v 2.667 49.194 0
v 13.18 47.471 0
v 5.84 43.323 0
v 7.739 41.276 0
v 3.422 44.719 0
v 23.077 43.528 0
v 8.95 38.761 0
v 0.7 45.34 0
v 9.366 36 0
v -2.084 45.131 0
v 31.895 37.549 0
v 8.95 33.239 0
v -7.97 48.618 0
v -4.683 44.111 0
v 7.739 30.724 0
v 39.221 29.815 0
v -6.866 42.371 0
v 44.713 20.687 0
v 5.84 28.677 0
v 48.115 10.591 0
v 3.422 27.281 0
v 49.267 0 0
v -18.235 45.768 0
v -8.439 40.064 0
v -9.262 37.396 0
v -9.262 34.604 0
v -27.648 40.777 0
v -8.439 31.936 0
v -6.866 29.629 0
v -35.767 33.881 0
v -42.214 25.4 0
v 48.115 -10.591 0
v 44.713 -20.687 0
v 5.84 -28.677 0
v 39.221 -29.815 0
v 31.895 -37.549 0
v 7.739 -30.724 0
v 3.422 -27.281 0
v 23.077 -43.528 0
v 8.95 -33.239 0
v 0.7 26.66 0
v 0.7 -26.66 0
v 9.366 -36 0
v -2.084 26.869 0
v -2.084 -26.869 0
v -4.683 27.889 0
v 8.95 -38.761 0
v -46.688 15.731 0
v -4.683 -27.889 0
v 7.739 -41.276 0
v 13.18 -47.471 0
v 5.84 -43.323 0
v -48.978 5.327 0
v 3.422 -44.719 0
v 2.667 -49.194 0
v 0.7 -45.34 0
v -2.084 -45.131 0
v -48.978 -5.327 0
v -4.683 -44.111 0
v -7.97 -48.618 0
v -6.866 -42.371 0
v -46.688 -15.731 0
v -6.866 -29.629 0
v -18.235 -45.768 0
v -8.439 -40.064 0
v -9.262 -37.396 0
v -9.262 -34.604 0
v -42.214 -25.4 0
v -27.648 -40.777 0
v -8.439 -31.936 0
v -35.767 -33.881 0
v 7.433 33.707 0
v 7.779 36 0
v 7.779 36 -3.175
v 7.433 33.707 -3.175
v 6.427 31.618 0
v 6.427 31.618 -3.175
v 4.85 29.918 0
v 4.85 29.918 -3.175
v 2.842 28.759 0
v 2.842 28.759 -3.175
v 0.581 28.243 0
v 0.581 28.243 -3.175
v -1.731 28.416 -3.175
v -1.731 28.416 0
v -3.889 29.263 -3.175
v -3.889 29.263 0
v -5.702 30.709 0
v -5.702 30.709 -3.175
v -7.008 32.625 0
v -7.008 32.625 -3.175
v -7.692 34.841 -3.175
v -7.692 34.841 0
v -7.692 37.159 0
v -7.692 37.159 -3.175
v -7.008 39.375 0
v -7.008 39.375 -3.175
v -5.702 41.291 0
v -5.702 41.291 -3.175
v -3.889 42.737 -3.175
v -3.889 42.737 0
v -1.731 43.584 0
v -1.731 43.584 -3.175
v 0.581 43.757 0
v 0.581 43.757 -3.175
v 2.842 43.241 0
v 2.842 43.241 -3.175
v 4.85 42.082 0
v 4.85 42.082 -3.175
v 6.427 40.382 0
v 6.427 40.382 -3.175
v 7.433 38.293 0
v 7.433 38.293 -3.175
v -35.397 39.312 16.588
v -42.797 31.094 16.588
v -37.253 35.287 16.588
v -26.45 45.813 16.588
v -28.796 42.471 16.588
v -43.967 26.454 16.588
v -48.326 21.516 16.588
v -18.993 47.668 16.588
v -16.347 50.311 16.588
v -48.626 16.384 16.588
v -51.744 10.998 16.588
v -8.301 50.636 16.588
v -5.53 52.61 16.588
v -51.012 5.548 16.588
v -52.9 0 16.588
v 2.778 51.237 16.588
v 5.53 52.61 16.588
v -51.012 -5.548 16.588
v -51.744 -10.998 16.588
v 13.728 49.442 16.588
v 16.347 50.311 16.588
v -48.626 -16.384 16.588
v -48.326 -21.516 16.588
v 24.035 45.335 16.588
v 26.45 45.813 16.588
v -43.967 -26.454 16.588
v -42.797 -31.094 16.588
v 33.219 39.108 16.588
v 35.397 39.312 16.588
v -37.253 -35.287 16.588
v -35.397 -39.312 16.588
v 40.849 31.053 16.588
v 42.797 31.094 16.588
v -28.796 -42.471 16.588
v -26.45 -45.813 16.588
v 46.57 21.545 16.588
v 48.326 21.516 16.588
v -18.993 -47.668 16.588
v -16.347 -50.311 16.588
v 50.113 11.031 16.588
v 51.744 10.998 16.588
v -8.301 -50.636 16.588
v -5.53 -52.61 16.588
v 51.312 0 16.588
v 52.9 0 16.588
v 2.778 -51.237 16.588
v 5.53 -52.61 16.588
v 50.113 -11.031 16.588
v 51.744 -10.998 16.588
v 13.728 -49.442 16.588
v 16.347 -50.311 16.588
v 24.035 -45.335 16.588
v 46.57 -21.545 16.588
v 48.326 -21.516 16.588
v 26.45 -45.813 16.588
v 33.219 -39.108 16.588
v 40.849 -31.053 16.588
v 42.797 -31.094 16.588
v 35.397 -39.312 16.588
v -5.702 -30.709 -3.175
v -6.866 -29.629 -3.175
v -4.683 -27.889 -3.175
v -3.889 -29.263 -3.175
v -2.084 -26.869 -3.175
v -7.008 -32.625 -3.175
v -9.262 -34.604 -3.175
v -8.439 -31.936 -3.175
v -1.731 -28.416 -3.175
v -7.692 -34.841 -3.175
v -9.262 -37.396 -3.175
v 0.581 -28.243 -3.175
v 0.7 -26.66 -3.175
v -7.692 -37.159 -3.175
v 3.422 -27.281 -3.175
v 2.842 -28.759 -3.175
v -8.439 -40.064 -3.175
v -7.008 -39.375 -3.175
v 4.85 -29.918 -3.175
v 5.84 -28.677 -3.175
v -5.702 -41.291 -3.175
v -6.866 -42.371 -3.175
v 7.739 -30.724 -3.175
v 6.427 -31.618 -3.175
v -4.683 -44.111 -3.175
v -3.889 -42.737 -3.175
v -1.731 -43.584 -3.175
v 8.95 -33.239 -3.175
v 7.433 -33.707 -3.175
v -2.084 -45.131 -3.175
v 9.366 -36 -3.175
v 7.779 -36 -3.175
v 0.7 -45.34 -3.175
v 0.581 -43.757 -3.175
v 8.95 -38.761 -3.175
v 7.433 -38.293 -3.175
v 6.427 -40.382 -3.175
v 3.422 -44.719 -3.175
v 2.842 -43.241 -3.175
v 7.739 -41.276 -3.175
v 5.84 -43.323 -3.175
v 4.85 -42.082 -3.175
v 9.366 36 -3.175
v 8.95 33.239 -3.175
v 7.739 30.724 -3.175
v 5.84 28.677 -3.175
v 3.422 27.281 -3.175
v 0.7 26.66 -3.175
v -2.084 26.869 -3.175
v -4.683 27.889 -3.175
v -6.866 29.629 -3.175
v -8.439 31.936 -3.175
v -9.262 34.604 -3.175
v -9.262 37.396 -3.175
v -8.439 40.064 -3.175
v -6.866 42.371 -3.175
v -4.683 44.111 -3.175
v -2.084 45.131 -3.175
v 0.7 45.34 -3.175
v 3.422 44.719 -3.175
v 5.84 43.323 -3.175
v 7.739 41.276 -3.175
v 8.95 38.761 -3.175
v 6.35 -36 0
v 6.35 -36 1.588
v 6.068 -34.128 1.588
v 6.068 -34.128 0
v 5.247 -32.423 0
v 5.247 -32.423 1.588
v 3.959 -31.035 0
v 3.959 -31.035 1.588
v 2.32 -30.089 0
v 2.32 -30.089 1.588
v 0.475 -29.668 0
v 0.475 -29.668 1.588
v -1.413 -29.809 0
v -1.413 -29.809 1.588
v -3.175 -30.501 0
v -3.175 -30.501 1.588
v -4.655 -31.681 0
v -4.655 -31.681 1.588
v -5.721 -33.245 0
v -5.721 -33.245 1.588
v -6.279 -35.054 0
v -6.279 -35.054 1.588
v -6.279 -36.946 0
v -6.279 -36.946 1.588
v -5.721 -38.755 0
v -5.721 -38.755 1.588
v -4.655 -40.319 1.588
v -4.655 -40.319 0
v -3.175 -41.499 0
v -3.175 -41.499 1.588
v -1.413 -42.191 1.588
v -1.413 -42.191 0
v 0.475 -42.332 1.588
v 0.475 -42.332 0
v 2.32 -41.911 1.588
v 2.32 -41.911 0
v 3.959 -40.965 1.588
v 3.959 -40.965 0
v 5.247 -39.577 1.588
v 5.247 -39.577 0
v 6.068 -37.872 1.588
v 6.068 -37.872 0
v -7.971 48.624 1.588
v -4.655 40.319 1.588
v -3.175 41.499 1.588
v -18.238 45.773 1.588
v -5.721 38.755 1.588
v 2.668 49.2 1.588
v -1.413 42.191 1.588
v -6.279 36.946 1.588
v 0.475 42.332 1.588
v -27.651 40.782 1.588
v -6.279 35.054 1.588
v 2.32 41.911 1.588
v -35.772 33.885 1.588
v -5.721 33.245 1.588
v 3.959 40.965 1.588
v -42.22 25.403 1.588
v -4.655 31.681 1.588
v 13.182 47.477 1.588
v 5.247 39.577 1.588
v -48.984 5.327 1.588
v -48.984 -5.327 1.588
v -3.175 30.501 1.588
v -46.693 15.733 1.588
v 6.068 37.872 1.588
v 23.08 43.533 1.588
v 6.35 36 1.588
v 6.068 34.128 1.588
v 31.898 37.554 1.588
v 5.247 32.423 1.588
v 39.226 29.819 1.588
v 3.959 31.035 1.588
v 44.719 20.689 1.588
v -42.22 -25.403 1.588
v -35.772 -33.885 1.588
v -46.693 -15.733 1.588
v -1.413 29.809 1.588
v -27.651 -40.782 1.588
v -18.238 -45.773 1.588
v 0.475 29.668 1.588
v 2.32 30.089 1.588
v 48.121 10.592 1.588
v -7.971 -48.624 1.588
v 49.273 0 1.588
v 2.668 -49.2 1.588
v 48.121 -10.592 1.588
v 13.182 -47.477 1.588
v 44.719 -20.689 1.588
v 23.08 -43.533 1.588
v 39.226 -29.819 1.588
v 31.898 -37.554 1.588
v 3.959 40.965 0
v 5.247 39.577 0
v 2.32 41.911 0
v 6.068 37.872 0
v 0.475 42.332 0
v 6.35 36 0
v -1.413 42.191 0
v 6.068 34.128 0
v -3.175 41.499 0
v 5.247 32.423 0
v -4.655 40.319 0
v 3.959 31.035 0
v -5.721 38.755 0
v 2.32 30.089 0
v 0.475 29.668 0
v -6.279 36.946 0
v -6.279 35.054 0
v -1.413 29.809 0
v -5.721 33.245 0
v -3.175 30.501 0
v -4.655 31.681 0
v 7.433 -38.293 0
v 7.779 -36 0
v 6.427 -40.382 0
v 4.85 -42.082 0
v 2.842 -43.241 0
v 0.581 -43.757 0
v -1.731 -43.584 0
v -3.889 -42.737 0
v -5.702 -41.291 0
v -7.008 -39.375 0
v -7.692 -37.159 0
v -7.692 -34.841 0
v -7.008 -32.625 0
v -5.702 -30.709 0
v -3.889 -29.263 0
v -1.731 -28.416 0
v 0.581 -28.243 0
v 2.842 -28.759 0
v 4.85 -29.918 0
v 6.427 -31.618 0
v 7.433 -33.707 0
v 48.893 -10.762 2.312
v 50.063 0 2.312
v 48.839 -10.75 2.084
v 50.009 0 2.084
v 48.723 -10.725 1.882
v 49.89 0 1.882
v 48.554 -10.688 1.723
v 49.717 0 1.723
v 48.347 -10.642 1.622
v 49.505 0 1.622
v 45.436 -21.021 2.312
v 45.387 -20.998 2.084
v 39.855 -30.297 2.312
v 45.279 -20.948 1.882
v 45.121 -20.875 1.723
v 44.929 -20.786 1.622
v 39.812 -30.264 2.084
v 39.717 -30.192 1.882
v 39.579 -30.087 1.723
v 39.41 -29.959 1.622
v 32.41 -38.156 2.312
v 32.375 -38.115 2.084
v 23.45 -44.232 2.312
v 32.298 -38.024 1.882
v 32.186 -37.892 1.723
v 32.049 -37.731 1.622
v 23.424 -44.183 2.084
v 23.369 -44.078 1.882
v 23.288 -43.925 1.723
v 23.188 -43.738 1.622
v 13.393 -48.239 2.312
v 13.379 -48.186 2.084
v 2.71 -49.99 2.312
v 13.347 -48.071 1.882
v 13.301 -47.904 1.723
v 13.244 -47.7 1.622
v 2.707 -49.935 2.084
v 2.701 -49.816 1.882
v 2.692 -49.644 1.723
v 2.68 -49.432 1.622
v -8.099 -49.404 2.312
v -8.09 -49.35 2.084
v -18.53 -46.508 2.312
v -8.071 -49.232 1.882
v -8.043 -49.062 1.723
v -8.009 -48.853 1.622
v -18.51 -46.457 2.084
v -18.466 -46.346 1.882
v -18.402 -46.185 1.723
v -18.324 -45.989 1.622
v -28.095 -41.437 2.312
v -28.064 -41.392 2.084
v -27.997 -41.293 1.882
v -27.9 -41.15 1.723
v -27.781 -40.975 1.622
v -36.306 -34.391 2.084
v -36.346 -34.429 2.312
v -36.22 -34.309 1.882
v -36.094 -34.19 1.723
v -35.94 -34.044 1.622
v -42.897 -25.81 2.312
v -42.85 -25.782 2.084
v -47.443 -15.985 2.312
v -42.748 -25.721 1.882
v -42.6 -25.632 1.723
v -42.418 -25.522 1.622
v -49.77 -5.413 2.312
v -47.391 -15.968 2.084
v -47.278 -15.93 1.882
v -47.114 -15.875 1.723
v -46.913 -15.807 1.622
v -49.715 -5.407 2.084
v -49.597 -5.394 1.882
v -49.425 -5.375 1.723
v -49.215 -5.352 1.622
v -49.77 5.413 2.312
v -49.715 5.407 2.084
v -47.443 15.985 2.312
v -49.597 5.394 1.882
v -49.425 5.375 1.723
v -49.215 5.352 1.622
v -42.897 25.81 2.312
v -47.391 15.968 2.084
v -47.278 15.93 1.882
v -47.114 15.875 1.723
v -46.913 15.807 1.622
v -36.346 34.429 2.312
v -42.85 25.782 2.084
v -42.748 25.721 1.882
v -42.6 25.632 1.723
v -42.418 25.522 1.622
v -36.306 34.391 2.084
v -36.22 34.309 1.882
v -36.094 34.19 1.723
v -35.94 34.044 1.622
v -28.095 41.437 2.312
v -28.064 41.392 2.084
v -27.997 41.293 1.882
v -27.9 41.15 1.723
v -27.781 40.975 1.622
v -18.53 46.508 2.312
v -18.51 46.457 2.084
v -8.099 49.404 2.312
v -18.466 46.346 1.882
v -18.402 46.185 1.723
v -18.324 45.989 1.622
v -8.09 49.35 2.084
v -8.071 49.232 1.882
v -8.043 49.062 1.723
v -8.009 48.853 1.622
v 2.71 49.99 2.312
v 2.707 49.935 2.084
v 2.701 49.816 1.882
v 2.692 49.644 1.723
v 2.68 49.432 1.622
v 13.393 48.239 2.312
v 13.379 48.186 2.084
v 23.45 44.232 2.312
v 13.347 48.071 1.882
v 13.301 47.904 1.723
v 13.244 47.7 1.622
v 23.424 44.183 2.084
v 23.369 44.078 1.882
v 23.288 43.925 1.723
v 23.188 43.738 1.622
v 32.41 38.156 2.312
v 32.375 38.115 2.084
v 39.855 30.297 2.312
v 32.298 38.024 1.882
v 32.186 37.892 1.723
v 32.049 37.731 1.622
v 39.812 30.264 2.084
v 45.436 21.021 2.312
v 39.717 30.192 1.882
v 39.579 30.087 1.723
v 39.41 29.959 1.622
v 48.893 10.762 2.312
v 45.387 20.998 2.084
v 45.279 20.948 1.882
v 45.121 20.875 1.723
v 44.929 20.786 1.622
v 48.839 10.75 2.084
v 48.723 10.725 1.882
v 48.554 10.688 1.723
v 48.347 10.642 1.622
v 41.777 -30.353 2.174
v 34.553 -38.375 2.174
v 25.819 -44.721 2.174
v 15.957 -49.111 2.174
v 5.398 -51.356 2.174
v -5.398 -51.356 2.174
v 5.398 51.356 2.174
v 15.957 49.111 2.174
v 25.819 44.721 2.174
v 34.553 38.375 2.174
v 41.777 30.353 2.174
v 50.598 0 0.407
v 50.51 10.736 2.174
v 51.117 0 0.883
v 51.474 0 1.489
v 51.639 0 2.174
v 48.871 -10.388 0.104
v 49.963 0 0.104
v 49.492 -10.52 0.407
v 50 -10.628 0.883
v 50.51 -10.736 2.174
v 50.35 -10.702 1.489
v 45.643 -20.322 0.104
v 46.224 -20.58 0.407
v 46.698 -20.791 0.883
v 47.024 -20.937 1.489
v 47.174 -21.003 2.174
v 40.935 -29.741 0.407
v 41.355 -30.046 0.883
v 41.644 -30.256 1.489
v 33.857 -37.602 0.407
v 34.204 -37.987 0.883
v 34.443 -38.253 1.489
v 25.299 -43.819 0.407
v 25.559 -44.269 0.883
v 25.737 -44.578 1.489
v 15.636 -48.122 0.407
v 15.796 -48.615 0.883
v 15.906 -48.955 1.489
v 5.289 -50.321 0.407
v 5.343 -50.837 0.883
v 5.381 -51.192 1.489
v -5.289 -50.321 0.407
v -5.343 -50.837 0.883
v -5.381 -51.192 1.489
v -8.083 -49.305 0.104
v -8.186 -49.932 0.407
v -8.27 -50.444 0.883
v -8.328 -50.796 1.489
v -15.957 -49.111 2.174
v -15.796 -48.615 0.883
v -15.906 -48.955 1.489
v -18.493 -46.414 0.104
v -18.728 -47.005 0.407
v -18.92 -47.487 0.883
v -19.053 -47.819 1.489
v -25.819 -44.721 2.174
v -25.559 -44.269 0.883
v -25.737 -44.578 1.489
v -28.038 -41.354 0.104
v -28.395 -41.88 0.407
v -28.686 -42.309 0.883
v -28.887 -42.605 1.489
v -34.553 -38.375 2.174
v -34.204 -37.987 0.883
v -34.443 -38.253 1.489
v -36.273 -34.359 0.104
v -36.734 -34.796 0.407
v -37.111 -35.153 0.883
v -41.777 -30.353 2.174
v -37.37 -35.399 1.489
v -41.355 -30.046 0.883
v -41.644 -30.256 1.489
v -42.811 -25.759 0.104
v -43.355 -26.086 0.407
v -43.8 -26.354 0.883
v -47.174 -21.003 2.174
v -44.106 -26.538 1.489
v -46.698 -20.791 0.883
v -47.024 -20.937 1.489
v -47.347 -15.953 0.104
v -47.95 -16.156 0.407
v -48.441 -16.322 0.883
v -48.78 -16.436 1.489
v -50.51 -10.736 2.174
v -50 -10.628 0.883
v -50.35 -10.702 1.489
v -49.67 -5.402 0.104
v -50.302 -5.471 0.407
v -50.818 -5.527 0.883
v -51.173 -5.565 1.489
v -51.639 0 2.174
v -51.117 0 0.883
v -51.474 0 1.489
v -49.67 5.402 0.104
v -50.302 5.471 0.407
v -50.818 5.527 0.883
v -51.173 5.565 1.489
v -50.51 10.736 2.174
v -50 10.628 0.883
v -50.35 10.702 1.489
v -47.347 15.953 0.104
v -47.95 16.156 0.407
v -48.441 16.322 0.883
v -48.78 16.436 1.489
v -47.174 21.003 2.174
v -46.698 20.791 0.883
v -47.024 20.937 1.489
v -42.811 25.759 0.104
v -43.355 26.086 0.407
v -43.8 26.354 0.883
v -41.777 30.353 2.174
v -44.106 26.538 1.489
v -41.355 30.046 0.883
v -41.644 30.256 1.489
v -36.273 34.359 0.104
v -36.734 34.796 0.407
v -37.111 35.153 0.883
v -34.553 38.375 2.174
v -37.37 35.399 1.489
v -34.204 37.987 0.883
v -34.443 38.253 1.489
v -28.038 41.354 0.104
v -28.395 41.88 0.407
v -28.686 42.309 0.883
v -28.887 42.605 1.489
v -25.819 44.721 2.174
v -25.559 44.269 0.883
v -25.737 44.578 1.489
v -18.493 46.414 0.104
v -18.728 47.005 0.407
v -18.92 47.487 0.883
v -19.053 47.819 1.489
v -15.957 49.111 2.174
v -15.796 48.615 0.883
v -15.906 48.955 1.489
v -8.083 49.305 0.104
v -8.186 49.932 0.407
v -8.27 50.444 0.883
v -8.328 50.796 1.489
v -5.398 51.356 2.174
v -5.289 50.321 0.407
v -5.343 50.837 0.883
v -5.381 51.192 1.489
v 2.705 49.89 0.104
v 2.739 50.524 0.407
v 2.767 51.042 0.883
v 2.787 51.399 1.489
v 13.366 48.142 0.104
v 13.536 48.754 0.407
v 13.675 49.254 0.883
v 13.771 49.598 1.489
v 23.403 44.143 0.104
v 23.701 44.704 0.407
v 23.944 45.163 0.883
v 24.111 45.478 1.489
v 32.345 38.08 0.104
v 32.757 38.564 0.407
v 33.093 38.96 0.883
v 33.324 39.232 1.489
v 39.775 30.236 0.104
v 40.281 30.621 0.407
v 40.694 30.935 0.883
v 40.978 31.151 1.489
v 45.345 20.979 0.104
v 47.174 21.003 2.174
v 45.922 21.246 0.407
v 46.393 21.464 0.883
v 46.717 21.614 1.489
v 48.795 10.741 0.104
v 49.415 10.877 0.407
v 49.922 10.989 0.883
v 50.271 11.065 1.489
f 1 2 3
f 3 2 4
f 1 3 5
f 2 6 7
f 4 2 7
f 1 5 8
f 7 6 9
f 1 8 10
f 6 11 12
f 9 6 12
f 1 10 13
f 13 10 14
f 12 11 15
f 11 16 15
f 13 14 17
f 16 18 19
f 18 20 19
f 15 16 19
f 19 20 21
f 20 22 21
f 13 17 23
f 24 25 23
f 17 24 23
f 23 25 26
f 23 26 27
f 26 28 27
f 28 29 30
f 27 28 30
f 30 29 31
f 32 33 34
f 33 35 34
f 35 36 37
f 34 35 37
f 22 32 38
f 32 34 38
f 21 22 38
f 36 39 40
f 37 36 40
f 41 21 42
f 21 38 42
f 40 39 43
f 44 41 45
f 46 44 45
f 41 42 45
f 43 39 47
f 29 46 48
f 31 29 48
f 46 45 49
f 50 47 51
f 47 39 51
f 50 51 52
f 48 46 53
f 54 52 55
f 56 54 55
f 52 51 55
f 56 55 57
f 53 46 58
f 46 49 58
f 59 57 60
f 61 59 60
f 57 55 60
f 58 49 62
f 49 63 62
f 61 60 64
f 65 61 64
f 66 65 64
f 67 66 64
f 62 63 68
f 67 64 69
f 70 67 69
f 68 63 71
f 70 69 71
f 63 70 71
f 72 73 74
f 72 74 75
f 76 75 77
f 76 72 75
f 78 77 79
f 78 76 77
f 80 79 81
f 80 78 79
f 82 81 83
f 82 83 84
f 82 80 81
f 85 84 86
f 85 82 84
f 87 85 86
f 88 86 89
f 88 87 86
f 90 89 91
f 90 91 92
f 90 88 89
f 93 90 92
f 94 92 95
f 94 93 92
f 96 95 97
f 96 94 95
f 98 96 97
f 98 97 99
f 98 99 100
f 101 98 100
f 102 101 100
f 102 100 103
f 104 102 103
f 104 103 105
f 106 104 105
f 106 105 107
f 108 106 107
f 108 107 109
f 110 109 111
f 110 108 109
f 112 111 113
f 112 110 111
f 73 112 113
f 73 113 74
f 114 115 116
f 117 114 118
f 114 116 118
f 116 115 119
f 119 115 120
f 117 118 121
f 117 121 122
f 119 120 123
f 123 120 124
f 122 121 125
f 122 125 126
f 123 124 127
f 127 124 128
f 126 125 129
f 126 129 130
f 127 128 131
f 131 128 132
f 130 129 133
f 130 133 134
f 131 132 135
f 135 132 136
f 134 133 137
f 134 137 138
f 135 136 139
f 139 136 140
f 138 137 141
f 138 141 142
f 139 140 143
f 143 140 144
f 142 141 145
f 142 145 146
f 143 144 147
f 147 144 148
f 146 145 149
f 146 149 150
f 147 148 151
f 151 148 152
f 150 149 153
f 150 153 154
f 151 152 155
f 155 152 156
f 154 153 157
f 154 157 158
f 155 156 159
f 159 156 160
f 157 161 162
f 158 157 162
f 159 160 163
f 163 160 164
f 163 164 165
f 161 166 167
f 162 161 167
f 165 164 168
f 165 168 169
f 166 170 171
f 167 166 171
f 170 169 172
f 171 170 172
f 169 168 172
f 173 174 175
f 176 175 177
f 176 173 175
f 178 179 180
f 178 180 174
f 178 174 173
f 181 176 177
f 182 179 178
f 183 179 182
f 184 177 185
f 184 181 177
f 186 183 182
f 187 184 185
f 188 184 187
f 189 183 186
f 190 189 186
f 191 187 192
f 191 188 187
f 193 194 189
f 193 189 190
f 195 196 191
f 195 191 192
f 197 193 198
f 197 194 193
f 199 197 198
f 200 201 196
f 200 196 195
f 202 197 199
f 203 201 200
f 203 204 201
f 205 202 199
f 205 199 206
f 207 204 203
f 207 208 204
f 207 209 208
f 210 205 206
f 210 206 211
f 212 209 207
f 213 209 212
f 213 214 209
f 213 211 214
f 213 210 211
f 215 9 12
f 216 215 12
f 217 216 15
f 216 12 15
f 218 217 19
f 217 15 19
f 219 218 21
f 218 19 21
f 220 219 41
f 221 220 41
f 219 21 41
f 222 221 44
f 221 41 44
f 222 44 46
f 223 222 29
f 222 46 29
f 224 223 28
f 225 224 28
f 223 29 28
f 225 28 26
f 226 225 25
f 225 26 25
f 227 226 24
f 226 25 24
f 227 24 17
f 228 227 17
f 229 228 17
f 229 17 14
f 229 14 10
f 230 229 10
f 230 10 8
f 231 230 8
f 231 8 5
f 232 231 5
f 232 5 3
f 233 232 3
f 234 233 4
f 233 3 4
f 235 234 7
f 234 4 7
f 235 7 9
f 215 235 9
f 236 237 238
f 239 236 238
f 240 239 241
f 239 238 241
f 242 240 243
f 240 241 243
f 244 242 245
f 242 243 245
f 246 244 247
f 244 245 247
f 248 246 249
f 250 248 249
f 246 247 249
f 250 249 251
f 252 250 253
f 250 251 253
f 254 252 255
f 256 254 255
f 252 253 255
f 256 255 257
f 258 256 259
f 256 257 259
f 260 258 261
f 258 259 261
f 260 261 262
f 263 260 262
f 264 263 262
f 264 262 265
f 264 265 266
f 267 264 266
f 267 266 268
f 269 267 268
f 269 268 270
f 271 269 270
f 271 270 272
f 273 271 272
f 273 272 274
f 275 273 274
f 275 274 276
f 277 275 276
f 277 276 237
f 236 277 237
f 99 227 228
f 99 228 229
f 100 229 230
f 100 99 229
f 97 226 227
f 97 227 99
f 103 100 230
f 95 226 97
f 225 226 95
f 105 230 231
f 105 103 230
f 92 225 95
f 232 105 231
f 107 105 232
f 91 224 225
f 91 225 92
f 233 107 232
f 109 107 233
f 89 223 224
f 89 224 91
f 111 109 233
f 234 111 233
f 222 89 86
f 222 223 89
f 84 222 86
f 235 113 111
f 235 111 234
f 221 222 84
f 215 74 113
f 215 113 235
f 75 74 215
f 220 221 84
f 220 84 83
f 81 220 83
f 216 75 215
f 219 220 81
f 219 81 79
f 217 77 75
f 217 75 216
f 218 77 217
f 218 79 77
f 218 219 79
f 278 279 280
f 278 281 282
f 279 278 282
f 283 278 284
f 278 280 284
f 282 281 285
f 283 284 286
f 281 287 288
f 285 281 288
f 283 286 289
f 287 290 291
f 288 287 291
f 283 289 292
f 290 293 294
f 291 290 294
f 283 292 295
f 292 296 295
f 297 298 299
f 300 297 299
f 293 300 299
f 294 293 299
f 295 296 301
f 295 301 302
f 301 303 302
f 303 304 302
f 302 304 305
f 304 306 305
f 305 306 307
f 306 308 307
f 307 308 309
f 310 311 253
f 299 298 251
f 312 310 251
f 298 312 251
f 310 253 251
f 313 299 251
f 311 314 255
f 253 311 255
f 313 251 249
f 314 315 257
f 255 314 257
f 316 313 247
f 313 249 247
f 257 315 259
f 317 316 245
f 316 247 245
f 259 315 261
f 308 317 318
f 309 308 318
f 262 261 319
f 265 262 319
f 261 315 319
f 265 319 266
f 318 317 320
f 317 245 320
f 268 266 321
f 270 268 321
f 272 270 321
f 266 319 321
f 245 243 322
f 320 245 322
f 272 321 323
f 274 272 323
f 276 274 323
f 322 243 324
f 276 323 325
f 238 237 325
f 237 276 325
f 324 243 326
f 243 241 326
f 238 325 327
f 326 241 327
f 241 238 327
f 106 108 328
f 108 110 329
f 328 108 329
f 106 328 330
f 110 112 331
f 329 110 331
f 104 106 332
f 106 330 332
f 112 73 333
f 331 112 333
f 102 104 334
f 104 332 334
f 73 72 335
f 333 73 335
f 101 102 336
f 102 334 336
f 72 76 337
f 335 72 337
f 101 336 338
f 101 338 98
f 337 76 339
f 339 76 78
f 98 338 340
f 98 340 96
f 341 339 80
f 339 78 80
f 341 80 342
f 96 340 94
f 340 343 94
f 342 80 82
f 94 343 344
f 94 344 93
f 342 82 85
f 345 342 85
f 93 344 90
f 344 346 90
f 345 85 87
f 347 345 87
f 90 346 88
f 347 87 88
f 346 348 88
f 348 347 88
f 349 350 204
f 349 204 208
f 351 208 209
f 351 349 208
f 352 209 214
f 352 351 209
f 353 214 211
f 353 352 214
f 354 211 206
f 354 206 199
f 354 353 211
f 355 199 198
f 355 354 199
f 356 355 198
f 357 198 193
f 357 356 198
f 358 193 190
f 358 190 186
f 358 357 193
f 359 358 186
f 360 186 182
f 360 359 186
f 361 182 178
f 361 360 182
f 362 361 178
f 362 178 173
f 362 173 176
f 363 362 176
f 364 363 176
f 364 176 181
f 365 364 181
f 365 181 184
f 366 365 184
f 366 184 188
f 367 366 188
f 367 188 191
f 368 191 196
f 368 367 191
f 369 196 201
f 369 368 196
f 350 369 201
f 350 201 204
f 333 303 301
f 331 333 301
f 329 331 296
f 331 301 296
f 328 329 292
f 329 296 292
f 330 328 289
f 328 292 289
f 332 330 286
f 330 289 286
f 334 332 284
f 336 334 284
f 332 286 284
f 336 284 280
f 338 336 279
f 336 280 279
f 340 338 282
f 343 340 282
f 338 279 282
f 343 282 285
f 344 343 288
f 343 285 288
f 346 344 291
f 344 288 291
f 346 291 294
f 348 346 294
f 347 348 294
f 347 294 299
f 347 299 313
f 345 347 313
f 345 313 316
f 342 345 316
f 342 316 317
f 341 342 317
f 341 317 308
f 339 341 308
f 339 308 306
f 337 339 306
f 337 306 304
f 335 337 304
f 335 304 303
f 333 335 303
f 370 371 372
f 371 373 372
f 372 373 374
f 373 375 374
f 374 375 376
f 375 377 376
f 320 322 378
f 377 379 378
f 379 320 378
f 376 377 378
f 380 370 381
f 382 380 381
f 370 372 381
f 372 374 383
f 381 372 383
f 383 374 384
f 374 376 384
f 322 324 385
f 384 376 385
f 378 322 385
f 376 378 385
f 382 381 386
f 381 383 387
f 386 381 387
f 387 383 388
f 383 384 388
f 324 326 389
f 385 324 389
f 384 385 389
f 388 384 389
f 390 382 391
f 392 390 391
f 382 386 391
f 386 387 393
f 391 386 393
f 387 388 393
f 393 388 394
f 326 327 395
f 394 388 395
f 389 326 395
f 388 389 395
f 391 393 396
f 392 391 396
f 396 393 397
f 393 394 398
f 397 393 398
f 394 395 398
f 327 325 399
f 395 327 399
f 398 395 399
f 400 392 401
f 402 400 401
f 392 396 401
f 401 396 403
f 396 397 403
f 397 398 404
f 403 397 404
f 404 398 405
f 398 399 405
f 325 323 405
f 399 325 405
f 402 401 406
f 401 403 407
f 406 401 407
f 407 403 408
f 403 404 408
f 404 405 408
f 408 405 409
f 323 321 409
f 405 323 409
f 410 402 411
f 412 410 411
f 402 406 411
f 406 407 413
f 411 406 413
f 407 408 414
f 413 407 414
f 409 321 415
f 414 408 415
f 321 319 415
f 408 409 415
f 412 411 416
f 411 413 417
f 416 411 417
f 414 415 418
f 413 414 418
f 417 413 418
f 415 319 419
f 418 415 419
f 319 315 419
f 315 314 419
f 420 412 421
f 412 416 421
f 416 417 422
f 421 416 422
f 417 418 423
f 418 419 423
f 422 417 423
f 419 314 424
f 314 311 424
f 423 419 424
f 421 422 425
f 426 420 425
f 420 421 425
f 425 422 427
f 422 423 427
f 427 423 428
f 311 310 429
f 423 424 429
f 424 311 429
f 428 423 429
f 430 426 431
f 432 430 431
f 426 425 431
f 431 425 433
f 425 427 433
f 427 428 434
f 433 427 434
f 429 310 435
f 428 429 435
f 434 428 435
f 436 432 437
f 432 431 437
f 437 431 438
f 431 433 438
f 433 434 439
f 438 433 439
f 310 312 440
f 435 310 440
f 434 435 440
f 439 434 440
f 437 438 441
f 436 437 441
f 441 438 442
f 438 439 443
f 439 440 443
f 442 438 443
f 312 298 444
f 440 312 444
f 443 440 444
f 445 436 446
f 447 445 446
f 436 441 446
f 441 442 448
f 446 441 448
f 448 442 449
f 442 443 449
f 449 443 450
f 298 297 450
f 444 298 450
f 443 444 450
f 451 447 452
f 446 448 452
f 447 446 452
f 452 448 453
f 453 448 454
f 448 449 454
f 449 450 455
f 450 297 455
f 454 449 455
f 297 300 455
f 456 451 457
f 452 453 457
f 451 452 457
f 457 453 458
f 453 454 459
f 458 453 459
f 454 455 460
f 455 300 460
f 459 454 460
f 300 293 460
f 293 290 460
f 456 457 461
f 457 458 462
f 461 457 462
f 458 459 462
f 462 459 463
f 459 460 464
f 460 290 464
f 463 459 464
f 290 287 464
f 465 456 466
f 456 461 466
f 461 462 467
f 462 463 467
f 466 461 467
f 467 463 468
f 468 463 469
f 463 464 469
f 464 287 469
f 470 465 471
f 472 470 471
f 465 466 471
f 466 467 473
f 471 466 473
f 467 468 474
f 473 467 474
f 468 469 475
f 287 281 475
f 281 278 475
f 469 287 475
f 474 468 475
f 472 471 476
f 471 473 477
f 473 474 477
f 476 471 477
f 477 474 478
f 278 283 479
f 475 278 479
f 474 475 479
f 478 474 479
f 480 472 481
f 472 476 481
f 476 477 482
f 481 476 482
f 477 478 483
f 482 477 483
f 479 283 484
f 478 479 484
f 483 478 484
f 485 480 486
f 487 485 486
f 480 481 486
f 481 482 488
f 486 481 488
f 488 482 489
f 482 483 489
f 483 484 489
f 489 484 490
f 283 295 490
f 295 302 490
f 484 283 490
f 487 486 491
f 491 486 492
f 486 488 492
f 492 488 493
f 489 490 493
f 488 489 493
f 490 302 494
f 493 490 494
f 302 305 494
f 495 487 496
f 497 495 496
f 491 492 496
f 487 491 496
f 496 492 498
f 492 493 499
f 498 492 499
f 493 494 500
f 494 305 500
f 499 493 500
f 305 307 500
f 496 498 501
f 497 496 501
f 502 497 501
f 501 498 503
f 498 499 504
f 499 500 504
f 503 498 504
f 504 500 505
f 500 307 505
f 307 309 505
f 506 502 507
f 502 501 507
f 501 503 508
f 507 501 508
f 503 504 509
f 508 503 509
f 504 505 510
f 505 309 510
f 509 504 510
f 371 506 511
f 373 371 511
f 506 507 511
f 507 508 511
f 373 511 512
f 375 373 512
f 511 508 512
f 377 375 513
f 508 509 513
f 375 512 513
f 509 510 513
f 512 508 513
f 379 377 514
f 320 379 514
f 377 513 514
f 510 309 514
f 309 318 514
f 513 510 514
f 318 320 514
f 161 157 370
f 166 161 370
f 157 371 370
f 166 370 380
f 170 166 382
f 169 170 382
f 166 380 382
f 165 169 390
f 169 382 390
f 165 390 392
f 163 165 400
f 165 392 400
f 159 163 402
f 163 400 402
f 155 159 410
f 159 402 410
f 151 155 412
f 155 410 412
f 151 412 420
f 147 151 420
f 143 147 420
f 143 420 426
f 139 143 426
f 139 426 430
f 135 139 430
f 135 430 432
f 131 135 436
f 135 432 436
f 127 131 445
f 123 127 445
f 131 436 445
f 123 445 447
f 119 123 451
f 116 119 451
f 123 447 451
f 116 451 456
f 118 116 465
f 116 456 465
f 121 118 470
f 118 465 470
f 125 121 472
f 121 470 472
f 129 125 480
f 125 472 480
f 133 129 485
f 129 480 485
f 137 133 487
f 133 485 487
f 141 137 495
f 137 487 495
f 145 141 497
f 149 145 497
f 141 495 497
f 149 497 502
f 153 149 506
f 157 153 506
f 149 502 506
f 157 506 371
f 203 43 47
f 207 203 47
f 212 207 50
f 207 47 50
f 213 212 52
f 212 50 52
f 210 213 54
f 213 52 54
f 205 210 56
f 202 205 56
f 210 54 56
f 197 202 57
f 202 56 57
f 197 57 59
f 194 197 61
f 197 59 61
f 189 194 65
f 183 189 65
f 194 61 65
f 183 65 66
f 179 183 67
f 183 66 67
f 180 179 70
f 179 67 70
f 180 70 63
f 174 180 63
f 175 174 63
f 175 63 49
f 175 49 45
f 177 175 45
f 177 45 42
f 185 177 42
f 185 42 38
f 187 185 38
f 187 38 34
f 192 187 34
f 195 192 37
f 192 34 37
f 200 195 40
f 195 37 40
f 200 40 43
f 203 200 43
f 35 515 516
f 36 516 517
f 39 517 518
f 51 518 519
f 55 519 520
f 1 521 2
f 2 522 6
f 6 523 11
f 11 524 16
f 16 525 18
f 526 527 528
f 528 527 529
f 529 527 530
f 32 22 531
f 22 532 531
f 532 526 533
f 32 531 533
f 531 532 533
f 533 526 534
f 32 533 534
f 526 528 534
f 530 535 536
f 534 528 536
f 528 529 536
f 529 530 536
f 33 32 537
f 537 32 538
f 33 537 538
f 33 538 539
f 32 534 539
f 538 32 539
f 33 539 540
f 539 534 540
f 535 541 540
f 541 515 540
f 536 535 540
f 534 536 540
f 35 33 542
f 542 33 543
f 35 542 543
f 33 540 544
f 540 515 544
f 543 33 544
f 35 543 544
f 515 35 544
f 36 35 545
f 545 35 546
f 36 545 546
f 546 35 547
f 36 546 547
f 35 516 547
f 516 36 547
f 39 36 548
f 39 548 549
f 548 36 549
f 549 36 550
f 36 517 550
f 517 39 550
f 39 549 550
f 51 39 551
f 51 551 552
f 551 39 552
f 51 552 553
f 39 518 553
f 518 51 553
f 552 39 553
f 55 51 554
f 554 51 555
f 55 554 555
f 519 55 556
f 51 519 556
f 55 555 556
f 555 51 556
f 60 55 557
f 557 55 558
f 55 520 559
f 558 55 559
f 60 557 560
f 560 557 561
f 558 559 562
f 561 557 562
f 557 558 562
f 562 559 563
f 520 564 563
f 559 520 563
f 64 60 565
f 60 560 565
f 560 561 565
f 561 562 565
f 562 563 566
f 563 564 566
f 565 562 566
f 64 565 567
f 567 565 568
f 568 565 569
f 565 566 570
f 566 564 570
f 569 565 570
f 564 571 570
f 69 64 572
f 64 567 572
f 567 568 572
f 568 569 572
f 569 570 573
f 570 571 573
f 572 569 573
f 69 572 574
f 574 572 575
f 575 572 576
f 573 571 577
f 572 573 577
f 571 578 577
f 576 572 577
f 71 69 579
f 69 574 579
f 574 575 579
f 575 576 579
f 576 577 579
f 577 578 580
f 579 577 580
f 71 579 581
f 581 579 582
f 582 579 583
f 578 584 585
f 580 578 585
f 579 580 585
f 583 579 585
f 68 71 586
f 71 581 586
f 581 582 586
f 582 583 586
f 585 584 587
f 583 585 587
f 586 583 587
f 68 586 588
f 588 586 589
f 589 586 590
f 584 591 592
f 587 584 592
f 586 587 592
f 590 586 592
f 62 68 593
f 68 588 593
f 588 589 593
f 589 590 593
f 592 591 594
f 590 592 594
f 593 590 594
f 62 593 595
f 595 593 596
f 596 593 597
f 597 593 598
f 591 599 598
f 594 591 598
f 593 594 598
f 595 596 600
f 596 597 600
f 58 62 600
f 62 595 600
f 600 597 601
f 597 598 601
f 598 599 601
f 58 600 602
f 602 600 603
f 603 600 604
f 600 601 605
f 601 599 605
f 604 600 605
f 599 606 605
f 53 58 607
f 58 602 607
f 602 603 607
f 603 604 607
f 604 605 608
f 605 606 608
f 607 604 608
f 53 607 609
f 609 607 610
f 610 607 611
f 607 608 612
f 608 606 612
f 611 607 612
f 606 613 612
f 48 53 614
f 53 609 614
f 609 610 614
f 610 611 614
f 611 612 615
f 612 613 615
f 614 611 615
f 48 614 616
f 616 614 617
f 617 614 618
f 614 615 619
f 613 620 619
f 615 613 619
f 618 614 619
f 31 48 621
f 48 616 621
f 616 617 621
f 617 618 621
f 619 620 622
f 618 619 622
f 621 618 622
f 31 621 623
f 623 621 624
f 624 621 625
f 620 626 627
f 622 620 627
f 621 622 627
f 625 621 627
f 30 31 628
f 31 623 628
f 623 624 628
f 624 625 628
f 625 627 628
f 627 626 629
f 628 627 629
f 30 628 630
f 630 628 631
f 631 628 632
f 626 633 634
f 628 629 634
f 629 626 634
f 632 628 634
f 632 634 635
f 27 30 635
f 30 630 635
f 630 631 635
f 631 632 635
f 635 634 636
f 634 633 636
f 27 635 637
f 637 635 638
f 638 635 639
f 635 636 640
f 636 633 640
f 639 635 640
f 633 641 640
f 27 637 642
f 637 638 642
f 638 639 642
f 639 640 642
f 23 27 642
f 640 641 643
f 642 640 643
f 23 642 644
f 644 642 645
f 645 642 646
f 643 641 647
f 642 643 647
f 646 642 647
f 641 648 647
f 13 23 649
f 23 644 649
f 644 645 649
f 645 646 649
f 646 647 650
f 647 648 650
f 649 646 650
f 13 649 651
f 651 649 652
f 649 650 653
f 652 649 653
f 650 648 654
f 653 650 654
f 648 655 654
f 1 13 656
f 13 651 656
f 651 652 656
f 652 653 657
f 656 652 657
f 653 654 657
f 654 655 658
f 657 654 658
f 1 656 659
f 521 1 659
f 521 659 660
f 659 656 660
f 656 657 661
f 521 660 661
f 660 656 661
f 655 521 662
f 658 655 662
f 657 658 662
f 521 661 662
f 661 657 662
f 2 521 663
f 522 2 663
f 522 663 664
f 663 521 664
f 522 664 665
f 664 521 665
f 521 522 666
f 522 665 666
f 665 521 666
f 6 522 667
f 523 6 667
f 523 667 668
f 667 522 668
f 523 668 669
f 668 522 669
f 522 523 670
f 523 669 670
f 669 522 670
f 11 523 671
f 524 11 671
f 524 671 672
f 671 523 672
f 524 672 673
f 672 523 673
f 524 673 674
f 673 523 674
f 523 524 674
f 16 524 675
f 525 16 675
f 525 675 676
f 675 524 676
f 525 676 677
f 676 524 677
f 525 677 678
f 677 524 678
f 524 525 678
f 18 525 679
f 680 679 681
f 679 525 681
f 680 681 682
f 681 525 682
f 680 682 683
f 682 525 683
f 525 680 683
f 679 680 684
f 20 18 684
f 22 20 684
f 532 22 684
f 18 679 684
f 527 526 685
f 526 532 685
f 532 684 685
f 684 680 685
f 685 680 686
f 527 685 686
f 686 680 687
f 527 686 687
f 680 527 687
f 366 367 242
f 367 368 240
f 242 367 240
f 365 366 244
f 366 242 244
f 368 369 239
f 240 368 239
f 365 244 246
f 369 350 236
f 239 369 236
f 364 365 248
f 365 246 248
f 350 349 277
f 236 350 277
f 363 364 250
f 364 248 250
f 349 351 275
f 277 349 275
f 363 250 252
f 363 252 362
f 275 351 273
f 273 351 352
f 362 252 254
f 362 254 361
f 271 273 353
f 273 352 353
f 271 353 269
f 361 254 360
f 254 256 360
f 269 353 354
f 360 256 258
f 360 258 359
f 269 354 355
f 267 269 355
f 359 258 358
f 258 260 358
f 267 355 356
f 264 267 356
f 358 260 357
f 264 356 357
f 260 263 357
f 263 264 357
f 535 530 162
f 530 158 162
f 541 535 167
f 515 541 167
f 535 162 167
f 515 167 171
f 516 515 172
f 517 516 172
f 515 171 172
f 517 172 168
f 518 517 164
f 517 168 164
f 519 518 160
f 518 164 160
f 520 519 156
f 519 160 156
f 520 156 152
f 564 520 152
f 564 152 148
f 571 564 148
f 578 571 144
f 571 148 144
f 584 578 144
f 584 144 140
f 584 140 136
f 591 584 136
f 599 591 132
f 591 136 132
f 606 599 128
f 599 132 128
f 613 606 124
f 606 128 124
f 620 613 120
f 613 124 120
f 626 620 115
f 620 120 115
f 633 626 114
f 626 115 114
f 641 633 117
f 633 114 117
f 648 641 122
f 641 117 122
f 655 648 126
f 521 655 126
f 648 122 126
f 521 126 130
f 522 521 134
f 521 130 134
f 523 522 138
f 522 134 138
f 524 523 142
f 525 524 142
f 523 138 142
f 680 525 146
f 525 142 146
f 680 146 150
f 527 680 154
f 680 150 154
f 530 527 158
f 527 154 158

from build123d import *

# Parameters (mm, degrees)
F2_R     = 6.35
F3_DEPTH = 1.5885
F4_R     = 9.36625
F4_R_2   = 7.77875
F5_DEPTH = 3.175


with BuildPart() as f1:
    # F0 (on Front) → F1 (revolve)
    with BuildSketch(Plane.XZ):
        with BuildLine():
            Line((0, 1.5875), (0, 0))
            Line((0, 0), (49.266598, 0))
            ThreePointArc((49.266598, 0), (50.875347, 0.625608), (51.638787, 2.17371))
            Line((51.638787, 2.17371), (52.89983, 16.5875))
            Line((52.89983, 16.5875), (51.31233, 16.5875))
            Line((51.31233, 16.5875), (50.063392, 2.31207))
            ThreePointArc((50.063392, 2.31207), (49.808912, 1.796036), (49.272662, 1.5875))
            Line((49.272662, 1.5875), (0, 1.5875))
        make_face()
    revolve(axis=Axis((0, 0, 0.79375), (0, 0, -1)))

    # F2 (on face) → F3 (cut, through all)
    with BuildSketch(Plane.XY.offset(1.5875)):
        with Locations((0, 36)):
            Circle(F2_R)
        with Locations((0, -36)):
            Circle(F2_R)
    extrude(amount=-F3_DEPTH, mode=Mode.SUBTRACT)

    # F4 (on face) → F5 (join)
    with BuildSketch(Plane(origin=(0, 0, 0), x_dir=(1, 0, 0), z_dir=(0, 0, -1))):
        with Locations((0, -36)):
            Circle(F4_R)
        with Locations((0, -36)):
            Circle(F4_R_2, mode=Mode.SUBTRACT)
        with Locations((0, 36)):
            Circle(F4_R)
        with Locations((0, 36)):
            Circle(F4_R_2, mode=Mode.SUBTRACT)
    extrude(amount=F5_DEPTH)


solid = f1.part
